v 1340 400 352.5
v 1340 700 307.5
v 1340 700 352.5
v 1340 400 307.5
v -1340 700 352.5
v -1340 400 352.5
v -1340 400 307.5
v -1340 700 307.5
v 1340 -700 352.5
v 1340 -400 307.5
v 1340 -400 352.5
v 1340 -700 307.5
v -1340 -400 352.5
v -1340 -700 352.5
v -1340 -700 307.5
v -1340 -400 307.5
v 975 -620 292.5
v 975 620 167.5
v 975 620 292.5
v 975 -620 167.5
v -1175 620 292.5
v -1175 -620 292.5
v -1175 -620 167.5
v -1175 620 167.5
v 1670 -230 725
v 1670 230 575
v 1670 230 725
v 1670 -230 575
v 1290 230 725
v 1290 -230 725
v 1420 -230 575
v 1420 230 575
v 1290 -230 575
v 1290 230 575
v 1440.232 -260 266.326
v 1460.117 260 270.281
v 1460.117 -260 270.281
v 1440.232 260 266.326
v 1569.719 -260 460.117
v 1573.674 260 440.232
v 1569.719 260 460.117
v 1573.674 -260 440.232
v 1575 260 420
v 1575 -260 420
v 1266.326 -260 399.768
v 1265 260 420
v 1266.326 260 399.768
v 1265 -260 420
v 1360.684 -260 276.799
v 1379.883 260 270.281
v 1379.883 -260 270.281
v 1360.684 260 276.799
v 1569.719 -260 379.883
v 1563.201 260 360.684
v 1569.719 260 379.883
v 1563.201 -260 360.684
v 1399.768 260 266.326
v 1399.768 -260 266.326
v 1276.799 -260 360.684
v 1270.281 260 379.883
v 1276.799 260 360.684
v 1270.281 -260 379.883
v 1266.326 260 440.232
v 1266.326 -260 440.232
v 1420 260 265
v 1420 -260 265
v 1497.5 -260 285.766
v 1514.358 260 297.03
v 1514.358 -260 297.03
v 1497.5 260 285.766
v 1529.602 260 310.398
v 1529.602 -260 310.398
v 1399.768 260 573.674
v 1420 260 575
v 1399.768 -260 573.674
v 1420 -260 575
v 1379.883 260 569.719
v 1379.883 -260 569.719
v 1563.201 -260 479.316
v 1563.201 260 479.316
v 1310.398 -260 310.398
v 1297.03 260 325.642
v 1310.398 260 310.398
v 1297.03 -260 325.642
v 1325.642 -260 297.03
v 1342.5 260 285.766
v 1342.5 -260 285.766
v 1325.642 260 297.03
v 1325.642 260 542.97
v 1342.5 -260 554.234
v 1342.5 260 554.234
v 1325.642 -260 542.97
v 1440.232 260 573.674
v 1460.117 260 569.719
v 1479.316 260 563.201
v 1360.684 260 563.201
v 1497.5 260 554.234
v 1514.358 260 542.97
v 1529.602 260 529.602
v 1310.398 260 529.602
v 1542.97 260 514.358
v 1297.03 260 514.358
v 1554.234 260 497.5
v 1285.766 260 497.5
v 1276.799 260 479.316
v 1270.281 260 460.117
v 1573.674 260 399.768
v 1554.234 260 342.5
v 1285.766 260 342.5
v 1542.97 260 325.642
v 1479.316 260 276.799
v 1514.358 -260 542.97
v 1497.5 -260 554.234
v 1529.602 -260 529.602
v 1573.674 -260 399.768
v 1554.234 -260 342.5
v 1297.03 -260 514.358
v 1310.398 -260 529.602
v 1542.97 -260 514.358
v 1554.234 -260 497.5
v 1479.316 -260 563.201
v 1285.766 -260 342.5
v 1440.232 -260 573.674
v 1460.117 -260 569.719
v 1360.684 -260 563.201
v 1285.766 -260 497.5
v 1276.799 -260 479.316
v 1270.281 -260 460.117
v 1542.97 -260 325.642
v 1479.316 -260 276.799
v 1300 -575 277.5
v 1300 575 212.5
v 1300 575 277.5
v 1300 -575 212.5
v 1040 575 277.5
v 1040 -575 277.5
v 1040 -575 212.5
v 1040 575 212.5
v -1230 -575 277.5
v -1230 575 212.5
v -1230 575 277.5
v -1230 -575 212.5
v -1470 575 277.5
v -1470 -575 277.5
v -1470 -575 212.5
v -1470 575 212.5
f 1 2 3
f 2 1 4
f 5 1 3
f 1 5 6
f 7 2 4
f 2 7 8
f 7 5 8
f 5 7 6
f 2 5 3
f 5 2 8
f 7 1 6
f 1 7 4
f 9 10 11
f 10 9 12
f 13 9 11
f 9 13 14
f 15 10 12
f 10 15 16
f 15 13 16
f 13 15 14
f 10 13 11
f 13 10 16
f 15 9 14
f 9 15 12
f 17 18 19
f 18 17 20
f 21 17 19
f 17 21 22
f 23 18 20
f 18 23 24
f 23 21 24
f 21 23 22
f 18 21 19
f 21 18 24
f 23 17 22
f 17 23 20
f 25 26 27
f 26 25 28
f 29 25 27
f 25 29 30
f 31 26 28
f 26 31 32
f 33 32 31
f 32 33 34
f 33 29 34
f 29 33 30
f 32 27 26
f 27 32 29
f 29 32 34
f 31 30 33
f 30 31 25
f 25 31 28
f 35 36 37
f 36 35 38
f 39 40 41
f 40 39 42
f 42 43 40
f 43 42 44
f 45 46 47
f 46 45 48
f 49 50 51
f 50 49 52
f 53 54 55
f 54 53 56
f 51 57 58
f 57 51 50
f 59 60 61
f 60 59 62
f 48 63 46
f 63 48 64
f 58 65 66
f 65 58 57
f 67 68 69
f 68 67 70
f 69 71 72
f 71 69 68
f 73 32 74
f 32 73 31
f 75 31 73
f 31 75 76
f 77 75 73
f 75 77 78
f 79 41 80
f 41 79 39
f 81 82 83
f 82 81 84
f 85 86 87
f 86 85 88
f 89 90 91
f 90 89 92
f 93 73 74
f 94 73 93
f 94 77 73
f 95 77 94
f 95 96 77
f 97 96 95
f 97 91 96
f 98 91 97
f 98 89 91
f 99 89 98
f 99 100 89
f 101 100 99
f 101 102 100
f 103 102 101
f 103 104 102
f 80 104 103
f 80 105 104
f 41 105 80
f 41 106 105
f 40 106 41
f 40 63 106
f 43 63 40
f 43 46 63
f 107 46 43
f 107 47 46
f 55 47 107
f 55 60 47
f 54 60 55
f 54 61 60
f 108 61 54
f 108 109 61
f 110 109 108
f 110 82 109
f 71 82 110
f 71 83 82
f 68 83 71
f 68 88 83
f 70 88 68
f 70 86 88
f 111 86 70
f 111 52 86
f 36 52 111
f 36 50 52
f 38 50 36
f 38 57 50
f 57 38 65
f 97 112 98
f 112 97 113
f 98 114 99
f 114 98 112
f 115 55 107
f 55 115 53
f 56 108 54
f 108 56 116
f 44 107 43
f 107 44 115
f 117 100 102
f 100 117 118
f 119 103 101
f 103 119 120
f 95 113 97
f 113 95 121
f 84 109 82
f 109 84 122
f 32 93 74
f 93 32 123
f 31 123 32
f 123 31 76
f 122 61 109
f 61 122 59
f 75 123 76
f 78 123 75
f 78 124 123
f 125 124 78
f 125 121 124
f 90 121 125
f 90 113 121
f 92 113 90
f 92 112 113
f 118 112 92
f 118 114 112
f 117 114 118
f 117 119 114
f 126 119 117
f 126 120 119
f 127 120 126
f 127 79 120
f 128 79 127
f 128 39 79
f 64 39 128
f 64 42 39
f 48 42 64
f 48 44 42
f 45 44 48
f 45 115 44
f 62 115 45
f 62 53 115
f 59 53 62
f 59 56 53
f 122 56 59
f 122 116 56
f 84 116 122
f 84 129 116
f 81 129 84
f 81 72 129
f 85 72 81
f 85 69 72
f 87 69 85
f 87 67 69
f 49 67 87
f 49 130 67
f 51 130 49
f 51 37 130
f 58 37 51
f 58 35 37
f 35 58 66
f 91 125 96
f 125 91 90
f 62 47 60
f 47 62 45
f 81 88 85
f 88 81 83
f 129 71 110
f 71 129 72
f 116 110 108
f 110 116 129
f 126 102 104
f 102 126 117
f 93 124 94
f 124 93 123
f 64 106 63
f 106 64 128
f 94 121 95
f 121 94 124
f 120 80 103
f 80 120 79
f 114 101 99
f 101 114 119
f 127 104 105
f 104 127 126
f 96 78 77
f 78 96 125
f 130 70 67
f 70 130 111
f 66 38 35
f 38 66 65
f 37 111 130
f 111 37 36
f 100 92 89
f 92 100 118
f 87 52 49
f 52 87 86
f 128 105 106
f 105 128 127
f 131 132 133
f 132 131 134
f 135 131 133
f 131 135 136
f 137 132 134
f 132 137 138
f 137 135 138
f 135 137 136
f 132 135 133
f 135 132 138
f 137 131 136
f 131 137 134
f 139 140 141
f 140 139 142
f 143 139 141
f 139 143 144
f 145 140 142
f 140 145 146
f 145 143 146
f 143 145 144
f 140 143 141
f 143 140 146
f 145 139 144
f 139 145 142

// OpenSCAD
// ElectricSedan concept geometry. Units: mm; +X front; +Z up; ground z=0.
$fn=48;
module box(p,s,c){color(c) translate(p) cube(s,center=true);}
module cyl(p,r,h,c){color(c) translate(p) rotate([90,0,0]) cylinder(r=r,h=h,center=true);}
box([0,550,330],[2680,300,45],"SlateGray");
box([0,-550,330],[2680,300,45],"SlateGray");
box([-100,0,230],[2150,1240,125],"Goldenrod");
box([1480,0,650],[380,460,150],"CadetBlue");
cyl([1420,0,420],155,520,"Peru");
box([1170,0,245],[260,1150,65],"SlateGray");
box([-1350,0,245],[240,1150,65],"SlateGray");
